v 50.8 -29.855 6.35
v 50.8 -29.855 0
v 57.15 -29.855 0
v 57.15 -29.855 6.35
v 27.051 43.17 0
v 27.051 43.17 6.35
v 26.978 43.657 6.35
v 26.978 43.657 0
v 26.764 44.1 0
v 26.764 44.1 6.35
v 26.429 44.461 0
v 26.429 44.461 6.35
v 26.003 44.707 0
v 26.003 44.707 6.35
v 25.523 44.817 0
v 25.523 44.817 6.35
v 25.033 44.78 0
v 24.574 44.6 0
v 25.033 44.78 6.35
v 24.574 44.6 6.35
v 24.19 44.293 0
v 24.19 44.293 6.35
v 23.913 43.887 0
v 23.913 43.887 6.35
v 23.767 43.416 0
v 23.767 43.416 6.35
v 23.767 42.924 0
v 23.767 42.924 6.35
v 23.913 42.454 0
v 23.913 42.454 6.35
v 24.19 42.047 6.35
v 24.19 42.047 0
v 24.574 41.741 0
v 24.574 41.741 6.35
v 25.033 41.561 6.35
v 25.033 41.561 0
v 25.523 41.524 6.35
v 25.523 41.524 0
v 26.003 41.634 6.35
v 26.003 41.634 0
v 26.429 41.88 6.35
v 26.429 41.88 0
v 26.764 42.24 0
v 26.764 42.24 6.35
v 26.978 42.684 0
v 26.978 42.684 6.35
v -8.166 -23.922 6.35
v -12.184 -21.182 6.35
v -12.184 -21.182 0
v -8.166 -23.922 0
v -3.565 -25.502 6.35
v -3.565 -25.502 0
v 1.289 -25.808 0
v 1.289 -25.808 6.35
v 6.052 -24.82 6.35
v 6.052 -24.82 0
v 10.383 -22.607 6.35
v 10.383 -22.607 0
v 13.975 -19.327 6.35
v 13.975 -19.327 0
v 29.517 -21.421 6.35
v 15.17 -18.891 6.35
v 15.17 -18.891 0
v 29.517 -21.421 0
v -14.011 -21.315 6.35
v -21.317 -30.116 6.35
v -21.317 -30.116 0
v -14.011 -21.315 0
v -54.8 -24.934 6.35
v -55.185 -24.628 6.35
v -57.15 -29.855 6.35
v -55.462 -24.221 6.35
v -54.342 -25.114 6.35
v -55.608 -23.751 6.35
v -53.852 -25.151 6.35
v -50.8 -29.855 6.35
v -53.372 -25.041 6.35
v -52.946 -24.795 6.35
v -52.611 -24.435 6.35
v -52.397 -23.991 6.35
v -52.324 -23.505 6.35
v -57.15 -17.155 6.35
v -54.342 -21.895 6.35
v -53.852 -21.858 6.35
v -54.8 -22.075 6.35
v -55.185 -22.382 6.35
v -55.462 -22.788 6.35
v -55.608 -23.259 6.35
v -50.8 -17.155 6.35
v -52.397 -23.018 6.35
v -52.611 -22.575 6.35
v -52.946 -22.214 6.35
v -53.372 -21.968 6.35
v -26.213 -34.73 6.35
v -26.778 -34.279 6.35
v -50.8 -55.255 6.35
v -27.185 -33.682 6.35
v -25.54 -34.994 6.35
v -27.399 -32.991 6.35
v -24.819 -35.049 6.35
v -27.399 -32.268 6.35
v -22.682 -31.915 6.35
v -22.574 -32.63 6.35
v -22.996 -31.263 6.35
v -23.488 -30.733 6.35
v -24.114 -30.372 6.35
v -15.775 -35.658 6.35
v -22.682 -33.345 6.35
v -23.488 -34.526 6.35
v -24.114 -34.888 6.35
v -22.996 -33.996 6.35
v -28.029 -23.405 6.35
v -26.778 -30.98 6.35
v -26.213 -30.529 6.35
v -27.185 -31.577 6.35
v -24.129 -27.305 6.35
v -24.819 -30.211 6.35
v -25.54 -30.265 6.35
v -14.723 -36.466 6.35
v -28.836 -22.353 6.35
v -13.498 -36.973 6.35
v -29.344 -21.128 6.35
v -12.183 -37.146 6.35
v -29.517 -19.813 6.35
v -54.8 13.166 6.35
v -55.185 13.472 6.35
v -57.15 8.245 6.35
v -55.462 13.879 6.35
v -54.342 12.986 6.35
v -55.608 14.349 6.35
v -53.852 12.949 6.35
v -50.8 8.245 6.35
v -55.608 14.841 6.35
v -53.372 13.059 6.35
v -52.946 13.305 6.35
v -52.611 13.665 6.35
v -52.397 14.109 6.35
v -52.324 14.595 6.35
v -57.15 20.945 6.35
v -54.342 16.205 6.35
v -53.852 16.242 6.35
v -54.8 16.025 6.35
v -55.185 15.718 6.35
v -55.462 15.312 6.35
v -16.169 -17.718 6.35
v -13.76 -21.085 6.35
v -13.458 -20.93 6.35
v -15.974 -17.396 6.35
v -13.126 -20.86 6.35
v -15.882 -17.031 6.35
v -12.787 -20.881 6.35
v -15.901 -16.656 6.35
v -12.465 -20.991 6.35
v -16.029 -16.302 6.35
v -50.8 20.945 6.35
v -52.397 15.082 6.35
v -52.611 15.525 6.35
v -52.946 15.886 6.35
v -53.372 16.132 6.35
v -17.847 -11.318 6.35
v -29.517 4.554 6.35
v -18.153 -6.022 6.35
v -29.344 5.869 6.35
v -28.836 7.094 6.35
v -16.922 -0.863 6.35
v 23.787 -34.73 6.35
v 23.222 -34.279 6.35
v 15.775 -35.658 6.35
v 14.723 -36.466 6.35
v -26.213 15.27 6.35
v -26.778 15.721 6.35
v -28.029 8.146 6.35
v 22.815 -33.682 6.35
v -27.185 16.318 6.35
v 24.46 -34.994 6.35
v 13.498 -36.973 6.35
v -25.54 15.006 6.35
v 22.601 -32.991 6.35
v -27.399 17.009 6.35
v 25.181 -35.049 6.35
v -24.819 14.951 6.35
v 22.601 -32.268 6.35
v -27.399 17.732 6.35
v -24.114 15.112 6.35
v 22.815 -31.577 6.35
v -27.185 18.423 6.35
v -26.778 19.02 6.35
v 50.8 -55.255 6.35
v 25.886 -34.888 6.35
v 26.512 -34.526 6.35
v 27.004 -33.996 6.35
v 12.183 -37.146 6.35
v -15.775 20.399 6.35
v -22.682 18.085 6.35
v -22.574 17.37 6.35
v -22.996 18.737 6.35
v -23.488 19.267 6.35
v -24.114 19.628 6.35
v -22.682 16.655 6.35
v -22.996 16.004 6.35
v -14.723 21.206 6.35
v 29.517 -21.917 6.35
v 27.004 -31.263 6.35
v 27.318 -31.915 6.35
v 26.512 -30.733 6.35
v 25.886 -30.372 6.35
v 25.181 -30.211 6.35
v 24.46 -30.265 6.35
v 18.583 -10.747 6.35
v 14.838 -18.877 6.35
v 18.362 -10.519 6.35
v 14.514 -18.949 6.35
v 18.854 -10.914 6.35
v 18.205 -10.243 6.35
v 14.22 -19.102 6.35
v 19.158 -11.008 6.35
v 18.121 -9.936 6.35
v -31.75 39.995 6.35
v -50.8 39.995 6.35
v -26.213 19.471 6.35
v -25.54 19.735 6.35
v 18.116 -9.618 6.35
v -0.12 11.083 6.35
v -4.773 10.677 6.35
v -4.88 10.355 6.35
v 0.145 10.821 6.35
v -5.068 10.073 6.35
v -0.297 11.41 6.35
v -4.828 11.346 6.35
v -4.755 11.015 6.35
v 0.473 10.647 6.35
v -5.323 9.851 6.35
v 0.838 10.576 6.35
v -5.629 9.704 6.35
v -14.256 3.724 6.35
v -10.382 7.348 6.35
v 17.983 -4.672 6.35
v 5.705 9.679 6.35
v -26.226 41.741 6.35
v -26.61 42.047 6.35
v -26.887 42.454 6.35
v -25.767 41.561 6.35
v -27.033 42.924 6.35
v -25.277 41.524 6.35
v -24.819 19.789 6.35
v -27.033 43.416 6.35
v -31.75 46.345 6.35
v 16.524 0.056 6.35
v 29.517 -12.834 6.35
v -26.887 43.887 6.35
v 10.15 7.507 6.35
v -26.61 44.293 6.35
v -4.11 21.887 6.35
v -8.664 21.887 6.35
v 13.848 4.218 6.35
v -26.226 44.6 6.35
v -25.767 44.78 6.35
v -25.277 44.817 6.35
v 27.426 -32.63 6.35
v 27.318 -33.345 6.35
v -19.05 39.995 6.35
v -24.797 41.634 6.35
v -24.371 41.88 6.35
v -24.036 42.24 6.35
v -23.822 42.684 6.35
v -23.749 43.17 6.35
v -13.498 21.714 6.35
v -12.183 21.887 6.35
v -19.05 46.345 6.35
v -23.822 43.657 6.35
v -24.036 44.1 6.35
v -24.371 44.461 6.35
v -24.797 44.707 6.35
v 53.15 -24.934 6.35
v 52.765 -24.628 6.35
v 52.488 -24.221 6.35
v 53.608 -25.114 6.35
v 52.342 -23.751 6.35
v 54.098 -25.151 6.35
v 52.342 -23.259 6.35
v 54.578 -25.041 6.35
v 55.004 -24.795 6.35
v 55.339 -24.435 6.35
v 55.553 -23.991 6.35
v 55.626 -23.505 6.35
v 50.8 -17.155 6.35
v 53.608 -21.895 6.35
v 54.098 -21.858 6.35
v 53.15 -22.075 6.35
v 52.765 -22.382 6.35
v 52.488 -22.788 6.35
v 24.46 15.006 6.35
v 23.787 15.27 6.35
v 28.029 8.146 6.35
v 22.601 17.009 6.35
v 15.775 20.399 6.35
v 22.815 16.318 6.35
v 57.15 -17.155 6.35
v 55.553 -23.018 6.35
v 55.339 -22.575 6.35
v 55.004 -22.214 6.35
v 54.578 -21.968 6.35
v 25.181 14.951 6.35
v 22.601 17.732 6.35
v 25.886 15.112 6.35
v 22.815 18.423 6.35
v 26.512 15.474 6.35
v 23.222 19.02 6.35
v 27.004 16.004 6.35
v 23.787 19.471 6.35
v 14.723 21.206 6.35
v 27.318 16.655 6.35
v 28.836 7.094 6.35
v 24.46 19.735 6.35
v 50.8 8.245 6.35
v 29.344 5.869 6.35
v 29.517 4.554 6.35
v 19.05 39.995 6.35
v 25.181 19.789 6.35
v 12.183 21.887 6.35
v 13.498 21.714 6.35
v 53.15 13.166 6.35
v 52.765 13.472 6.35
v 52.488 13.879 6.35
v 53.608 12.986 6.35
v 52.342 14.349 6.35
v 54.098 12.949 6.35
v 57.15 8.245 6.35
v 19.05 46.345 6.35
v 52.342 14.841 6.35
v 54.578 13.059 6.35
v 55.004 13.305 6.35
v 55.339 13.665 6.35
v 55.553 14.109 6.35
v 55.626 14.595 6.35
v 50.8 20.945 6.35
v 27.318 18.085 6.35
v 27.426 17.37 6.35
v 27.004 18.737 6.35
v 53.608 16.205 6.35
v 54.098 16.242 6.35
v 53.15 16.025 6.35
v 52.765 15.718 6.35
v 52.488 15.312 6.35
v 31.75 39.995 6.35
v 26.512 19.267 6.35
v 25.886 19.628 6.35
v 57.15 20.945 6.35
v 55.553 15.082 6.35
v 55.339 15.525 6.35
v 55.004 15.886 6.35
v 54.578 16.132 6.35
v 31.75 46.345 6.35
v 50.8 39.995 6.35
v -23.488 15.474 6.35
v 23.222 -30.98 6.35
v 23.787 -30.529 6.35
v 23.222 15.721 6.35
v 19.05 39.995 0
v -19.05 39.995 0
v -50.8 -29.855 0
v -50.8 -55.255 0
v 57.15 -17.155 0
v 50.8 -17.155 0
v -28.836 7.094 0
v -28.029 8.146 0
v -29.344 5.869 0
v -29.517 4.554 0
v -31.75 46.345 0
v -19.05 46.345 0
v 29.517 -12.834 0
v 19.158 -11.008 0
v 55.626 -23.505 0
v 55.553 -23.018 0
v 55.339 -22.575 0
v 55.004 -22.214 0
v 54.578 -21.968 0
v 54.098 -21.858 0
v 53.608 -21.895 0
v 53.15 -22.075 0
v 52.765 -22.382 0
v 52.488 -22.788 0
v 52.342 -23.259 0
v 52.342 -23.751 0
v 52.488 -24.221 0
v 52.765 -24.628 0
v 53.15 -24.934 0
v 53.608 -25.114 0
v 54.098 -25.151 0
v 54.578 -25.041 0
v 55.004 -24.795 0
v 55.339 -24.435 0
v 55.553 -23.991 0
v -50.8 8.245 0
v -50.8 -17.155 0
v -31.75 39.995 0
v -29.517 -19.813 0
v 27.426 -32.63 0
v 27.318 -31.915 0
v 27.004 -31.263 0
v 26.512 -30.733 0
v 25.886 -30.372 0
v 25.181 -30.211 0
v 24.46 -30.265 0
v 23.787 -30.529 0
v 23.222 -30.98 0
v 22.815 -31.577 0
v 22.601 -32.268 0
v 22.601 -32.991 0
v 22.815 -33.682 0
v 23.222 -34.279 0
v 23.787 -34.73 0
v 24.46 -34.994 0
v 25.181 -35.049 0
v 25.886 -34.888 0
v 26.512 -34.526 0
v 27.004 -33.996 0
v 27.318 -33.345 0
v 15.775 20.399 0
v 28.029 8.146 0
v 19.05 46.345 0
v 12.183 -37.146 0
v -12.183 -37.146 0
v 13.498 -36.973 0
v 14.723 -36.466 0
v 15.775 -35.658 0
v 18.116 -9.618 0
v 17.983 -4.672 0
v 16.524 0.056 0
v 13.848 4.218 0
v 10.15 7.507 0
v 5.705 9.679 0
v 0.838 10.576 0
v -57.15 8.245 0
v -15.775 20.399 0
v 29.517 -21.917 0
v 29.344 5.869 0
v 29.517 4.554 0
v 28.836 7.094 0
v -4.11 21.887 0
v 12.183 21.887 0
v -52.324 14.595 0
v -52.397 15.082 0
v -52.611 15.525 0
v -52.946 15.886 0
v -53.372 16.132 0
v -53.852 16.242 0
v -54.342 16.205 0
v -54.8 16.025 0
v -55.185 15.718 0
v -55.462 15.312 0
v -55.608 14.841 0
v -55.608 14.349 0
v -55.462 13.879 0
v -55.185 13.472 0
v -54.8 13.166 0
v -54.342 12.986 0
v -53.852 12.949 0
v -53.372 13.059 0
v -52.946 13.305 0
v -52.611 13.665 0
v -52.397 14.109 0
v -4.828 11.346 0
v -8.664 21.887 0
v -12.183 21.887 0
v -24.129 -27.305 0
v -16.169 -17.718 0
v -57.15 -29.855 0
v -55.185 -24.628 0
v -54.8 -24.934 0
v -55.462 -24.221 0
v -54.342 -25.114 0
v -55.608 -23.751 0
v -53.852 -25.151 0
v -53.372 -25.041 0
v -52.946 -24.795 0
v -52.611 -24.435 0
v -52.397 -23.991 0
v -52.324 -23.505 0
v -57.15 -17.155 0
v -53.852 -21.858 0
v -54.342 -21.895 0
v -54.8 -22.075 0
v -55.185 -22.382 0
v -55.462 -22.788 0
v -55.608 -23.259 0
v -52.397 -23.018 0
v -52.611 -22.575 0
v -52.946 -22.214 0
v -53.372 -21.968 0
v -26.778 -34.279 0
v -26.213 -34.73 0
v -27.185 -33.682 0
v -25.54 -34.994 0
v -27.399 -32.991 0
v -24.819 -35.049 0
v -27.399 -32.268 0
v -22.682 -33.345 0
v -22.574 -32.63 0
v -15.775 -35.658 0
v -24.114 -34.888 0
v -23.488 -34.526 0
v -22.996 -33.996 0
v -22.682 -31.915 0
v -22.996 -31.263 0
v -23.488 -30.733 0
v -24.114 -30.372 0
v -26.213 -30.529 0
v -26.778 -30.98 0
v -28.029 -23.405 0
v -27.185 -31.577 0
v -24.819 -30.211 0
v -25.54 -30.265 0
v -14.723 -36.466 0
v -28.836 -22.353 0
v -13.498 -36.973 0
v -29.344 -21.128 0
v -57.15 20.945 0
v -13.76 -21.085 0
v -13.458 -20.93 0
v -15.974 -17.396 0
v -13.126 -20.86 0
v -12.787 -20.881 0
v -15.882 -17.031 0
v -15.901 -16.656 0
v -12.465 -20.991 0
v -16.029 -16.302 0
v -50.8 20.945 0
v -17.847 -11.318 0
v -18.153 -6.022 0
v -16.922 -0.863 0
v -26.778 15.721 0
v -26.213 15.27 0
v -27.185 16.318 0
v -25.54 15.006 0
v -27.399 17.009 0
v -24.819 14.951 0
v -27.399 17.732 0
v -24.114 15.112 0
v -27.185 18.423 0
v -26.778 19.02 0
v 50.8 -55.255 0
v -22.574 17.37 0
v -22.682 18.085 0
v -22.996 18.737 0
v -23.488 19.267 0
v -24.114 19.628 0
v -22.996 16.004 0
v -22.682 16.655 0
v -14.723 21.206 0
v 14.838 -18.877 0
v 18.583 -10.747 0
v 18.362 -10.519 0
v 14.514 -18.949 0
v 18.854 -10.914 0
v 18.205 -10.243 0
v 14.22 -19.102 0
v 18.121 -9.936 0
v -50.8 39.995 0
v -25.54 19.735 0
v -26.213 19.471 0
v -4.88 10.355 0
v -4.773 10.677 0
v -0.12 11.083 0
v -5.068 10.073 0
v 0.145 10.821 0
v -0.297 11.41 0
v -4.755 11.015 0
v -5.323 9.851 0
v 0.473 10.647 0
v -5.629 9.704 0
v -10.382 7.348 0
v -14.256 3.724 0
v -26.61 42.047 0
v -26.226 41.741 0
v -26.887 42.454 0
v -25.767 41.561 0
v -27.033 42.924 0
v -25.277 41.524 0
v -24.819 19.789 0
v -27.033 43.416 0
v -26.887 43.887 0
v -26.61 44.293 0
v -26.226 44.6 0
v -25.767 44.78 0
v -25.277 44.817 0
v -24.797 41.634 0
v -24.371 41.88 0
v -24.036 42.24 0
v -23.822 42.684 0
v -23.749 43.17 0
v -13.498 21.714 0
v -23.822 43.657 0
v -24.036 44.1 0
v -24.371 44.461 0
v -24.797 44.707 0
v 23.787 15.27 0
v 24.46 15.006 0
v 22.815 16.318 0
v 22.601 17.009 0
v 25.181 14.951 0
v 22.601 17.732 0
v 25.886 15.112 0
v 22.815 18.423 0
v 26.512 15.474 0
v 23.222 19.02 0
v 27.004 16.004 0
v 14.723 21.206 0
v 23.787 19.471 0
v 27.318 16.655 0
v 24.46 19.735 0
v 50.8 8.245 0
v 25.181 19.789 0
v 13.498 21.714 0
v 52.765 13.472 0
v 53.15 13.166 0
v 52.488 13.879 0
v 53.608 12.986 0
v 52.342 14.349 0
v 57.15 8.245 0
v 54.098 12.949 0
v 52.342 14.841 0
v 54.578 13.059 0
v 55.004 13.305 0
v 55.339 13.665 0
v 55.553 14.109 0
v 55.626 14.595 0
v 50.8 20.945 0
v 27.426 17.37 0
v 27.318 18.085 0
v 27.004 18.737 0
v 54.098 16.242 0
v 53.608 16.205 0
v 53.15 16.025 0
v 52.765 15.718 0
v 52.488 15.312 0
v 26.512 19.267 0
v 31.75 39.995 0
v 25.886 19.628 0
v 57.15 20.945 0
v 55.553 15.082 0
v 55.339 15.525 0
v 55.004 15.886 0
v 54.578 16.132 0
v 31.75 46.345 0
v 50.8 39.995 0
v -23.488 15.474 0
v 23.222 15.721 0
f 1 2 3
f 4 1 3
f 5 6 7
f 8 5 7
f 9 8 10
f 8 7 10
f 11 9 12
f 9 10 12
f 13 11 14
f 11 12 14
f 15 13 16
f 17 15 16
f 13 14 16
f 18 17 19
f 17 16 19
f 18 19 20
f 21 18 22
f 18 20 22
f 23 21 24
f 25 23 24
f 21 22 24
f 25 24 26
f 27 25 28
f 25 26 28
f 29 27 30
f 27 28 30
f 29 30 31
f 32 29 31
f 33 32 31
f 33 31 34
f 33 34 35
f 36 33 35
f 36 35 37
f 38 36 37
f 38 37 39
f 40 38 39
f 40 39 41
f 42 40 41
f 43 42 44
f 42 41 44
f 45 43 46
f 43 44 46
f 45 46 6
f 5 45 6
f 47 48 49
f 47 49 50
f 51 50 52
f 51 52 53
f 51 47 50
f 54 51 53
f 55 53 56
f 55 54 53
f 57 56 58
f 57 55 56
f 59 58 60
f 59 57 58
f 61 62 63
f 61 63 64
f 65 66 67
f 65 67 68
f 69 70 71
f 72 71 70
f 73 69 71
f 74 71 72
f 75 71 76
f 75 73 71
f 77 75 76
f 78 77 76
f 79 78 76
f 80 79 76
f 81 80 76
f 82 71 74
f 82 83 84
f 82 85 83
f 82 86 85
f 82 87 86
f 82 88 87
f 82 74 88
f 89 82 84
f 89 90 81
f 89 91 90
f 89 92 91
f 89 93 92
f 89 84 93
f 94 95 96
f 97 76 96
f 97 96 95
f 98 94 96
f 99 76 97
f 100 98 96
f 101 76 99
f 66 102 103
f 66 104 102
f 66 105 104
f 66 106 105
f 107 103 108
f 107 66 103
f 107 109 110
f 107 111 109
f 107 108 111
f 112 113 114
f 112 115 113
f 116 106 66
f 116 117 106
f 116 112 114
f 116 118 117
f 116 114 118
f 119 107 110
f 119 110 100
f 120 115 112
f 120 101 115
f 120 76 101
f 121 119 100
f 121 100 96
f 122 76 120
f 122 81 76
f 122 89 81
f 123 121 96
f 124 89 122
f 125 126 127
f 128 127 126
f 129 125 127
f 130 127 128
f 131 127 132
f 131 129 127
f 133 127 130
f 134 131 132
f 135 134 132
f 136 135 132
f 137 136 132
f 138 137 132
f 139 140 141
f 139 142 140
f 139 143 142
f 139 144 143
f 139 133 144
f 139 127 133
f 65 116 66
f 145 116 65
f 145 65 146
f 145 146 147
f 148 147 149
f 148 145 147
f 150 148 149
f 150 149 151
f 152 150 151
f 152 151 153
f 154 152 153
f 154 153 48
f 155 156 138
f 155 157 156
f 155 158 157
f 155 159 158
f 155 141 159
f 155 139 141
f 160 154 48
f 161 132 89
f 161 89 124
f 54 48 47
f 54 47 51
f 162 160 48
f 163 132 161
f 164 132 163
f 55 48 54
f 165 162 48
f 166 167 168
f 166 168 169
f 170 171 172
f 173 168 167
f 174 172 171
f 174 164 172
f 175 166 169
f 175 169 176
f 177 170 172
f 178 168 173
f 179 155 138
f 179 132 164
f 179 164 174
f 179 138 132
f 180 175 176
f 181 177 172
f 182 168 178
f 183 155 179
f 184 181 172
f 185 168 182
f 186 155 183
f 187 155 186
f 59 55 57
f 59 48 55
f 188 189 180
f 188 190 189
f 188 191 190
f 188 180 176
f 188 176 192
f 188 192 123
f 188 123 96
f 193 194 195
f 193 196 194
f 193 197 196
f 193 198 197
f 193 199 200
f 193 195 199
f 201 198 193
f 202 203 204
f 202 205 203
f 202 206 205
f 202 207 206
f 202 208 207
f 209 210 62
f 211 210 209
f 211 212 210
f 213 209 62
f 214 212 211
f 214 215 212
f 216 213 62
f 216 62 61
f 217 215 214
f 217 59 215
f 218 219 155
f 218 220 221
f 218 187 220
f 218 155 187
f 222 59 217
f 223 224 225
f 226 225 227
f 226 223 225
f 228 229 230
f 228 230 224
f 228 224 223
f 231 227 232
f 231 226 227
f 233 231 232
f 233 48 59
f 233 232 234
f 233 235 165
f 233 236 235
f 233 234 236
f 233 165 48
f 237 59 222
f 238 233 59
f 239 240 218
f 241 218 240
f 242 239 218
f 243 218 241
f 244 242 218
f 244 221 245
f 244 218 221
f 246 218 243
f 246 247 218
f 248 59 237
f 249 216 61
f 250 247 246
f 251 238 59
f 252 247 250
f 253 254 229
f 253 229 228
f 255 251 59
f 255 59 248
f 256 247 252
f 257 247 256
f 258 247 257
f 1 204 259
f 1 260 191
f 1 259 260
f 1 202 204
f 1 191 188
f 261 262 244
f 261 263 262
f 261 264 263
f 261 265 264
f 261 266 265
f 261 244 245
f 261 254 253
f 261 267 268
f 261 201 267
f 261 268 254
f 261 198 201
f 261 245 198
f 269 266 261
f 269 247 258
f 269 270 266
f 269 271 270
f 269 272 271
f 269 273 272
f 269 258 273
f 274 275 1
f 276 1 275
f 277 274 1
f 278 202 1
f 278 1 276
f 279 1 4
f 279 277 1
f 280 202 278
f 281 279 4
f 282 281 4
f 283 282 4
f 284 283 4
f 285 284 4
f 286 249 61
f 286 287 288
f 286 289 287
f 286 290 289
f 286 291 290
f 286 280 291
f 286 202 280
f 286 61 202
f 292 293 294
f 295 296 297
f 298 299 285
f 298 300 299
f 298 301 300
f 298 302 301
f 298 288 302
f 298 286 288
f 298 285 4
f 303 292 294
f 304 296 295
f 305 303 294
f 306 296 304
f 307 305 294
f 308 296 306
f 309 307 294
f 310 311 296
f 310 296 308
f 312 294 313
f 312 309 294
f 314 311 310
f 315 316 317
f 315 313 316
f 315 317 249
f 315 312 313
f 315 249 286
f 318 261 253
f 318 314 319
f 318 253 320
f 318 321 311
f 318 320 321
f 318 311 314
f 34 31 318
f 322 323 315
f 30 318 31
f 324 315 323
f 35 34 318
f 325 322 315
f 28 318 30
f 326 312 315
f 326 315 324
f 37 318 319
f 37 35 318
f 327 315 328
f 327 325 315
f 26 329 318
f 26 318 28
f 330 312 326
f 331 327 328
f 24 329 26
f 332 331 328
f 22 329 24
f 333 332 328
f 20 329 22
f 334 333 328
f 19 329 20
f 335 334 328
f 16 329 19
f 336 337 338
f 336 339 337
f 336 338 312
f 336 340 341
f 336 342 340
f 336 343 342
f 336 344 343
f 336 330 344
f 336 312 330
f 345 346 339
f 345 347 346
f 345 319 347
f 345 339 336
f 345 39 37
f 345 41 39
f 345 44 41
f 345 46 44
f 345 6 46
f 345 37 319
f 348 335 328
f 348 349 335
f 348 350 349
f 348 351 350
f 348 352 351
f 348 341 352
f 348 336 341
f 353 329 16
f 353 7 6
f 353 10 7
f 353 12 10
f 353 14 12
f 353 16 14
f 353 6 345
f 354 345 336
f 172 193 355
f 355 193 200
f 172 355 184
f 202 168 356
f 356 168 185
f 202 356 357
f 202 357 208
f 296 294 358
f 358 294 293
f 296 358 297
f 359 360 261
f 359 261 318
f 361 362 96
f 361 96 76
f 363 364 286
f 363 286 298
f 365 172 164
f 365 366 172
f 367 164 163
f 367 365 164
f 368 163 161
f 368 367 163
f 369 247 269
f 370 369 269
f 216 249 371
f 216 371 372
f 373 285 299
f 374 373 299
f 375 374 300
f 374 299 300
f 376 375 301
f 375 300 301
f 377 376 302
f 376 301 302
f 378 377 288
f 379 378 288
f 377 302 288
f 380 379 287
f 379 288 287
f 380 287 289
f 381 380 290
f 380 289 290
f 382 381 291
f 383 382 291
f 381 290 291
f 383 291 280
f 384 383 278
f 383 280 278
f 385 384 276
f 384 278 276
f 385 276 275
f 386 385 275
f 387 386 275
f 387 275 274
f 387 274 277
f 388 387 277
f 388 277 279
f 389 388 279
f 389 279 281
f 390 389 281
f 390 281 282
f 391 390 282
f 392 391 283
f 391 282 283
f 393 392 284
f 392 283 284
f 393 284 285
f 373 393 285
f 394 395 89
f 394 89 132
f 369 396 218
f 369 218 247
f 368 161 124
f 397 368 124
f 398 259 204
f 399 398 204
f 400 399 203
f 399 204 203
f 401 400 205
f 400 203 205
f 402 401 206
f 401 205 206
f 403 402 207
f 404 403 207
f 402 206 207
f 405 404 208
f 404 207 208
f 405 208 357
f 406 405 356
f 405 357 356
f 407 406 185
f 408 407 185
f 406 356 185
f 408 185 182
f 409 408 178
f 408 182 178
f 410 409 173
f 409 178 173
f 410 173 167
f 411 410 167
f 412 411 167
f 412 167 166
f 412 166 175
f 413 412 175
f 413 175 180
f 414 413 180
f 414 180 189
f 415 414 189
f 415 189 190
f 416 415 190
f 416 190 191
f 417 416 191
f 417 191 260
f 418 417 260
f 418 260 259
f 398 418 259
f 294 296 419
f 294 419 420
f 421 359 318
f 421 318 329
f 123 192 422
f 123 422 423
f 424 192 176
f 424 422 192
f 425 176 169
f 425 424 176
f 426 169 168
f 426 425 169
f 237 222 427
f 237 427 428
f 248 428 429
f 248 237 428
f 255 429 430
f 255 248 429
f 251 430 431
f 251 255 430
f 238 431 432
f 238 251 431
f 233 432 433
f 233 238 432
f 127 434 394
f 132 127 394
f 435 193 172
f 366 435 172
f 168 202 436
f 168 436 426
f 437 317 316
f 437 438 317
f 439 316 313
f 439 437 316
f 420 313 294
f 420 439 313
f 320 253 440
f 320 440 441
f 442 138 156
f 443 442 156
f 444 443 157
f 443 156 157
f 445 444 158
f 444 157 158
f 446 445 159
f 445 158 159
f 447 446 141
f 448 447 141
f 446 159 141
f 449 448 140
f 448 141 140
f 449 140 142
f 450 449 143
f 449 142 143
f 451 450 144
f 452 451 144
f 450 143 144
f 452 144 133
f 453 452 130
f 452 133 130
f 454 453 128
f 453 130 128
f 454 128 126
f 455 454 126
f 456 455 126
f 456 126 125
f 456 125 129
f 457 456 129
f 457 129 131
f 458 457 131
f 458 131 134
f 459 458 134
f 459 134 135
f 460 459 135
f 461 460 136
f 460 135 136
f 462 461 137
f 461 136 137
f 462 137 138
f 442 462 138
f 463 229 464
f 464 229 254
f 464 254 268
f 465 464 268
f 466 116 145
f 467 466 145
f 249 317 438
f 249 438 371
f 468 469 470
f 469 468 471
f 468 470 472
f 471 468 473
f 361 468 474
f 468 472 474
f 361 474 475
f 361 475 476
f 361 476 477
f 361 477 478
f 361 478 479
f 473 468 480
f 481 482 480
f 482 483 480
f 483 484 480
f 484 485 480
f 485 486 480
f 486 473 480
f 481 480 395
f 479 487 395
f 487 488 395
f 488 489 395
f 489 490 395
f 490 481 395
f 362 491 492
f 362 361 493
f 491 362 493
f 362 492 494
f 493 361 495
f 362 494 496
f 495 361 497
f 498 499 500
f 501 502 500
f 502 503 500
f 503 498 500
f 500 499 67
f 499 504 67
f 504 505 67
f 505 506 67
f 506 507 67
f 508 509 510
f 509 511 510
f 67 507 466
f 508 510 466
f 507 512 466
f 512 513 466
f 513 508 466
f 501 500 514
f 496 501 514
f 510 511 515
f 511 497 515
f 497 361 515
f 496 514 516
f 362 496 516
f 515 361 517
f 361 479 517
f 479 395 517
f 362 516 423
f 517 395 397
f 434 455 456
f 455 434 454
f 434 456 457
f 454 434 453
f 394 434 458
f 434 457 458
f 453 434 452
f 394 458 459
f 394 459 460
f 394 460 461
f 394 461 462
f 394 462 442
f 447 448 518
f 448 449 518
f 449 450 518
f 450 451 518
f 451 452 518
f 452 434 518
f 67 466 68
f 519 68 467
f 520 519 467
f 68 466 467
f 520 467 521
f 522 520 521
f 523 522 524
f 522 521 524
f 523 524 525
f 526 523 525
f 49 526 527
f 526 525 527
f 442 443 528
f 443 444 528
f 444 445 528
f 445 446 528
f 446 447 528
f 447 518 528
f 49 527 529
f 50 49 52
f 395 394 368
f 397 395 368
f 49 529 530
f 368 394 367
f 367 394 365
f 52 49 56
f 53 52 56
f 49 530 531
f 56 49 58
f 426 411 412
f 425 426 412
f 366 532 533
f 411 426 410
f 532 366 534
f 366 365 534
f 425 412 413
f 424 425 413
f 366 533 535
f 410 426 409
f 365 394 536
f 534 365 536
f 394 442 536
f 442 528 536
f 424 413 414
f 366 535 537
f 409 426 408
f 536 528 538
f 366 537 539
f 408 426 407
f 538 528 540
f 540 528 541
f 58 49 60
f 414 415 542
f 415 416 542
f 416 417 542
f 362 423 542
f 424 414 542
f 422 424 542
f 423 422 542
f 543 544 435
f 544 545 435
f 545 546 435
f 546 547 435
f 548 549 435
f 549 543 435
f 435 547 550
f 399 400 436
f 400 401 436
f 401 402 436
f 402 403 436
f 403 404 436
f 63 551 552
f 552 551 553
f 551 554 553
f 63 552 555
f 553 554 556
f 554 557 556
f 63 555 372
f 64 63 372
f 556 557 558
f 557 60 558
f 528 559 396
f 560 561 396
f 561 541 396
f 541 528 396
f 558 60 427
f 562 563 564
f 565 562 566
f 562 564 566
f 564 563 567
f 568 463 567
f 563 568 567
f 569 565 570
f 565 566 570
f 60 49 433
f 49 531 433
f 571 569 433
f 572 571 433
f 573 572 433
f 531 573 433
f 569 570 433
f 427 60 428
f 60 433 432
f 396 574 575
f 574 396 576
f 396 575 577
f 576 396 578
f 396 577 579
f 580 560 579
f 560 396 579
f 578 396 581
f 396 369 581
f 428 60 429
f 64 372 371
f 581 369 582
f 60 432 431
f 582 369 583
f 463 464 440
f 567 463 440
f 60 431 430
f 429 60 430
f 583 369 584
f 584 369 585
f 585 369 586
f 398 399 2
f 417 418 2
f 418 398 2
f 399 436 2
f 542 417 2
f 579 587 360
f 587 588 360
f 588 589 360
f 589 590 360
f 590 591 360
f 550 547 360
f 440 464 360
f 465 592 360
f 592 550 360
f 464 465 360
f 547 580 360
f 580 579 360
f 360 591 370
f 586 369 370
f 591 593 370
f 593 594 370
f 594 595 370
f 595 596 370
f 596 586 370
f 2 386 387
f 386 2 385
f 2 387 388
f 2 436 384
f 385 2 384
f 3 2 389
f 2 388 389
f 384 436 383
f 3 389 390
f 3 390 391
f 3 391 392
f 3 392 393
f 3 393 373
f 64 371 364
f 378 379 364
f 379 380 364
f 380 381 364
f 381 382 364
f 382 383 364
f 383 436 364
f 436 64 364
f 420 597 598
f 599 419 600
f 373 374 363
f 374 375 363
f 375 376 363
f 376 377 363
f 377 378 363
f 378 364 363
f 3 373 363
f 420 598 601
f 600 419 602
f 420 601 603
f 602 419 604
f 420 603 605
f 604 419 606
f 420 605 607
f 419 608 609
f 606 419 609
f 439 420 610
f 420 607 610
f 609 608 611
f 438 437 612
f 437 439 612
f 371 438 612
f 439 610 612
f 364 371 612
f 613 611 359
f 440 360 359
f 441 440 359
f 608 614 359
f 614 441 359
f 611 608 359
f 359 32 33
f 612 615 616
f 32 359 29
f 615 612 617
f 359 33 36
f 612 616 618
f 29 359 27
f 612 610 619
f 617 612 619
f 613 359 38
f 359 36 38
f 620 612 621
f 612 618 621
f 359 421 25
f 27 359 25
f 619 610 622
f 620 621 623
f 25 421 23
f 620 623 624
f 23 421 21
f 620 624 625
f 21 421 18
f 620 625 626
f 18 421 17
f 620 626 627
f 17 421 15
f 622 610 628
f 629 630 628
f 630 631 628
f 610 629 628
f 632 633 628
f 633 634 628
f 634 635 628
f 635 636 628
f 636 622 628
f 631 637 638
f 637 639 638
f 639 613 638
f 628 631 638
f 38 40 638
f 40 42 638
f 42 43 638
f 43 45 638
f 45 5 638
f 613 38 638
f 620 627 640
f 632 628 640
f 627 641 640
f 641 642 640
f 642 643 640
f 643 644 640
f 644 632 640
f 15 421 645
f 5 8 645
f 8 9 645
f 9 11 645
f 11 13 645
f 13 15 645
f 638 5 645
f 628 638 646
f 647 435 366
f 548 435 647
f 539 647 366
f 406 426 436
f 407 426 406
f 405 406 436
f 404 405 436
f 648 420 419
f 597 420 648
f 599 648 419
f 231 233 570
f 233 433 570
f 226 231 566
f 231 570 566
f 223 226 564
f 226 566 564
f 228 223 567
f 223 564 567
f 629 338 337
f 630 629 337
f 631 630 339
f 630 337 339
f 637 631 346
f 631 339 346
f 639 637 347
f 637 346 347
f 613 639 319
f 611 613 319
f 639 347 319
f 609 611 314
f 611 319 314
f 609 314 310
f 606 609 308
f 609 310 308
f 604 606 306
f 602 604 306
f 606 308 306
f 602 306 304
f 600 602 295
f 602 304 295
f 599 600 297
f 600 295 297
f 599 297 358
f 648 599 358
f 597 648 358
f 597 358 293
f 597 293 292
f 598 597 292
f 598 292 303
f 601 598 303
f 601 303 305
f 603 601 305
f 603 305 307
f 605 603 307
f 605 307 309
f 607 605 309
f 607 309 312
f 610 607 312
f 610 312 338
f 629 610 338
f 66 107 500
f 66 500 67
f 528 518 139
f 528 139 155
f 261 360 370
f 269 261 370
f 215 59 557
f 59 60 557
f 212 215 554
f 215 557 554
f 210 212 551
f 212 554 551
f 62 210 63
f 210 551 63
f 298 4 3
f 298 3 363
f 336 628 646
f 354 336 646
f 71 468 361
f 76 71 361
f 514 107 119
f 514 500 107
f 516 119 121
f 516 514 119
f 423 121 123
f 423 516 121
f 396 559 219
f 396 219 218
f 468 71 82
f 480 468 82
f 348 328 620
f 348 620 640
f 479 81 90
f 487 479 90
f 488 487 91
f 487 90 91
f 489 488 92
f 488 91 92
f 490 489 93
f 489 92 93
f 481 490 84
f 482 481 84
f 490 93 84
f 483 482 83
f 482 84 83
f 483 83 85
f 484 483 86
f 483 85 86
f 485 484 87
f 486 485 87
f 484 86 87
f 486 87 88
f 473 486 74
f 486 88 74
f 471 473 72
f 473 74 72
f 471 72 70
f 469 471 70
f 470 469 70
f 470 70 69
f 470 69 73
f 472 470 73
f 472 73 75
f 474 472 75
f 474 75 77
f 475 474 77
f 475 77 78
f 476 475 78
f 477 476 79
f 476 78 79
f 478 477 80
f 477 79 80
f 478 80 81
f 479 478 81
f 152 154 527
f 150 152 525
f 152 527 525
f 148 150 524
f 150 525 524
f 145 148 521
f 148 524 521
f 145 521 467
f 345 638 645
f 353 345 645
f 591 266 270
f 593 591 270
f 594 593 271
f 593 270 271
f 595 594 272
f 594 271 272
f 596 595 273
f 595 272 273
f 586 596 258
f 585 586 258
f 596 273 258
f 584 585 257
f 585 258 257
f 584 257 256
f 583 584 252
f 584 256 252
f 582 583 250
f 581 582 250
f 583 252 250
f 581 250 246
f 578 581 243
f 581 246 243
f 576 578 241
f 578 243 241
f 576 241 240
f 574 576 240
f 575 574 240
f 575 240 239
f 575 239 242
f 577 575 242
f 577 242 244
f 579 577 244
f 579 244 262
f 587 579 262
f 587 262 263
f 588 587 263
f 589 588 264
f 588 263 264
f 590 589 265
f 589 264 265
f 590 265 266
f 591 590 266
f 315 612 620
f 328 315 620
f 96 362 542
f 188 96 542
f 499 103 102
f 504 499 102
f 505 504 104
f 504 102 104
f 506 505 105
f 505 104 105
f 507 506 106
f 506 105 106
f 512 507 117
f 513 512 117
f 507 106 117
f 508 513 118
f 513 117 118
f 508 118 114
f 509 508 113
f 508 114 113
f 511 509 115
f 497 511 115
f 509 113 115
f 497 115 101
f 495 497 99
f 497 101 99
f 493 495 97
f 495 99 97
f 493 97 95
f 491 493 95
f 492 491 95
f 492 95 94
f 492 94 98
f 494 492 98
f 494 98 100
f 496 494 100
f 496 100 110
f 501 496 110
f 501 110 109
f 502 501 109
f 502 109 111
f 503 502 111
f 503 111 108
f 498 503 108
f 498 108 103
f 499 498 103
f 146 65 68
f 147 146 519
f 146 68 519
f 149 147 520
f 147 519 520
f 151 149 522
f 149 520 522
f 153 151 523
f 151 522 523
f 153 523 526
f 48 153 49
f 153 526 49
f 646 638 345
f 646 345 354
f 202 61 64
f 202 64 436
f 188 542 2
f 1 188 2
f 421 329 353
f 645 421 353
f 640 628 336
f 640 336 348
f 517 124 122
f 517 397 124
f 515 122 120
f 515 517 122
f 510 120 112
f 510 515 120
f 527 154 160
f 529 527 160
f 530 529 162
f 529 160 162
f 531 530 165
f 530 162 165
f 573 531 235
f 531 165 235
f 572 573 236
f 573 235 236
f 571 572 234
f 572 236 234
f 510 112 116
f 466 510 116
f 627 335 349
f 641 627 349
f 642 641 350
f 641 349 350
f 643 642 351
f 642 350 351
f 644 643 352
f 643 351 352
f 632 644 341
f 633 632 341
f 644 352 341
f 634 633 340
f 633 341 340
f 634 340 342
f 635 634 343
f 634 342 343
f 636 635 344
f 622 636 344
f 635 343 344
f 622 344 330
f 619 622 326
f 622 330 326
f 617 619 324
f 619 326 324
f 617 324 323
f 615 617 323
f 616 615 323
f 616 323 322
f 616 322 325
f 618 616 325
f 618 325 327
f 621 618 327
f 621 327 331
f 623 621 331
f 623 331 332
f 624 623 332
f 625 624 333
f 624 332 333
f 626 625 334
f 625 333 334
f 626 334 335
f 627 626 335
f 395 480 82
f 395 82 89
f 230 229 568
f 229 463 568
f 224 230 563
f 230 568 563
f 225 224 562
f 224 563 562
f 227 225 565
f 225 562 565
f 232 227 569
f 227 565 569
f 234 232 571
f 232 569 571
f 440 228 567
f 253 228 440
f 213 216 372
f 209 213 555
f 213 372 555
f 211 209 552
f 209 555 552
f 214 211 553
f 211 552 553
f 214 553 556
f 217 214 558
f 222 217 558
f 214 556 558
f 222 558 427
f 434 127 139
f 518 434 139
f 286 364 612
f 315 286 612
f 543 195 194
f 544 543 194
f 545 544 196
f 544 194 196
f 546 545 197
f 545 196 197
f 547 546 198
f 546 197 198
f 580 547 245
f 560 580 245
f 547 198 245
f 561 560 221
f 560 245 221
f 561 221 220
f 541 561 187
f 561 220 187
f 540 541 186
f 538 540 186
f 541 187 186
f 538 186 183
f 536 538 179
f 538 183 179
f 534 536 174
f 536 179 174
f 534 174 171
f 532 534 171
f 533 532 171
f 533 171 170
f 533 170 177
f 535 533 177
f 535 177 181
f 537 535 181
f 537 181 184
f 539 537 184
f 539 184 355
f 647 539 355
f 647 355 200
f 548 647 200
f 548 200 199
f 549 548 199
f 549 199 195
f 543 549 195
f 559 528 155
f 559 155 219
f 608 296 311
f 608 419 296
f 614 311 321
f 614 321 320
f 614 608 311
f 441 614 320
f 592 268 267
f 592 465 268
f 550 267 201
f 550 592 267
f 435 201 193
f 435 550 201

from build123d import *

# Parameters (mm, degrees)
SKETCH1_W           = 101.6
SKETCH1_H           = 95.25
BOSS_EXTRUDE1_DEPTH = 6.35
SKETCH2_W           = 12.7
SKETCH2_H           = 6.35
SKETCH2_R           = 1.651
SKETCH2_W_2         = 6.35
SKETCH2_H_2         = 12.7
BOSS_EXTRUDE2_DEPTH = 6.35
SKETCH5_R           = 2.4257
CUT_EXTRUDE1_DEPTH  = 80.746567925
FILLET1_R           = 5.08
FILLET2_R           = 1.27


with BuildPart() as part:
    # Sketch1 → Boss-Extrude1 (new body)
    with BuildSketch(Plane.XY):
        with Locations((0, -7.629593436)):
            Rectangle(SKETCH1_W, SKETCH1_H)
    extrude(amount=BOSS_EXTRUDE1_DEPTH)

    # Sketch2 → Boss-Extrude2 (add)
    # profile 1 of 6: a face of its own
    with BuildSketch(Plane.XY.offset(6.35)):
        with Locations((-25.4, 43.170406564)):
            Rectangle(SKETCH2_W, SKETCH2_H)
        with Locations((-25.4, 43.170406564)):
            Circle(SKETCH2_R, mode=Mode.SUBTRACT)
    # profile 2 of 6: a face of its own
    with BuildSketch(Plane.XY.offset(6.35)):
        with Locations((25.4, 43.170406564)):
            Rectangle(SKETCH2_W, SKETCH2_H)
        with Locations((25.4, 43.170406564)):
            Circle(SKETCH2_R, mode=Mode.SUBTRACT)
    # profile 3 of 6: a face of its own
    with BuildSketch(Plane.XY.offset(6.35)):
        with Locations((53.975, 14.595406564)):
            Rectangle(SKETCH2_W_2, SKETCH2_H_2)
        with Locations((53.975, 14.595406564)):
            Circle(SKETCH2_R, mode=Mode.SUBTRACT)
    # profile 4 of 6: a face of its own
    with BuildSketch(Plane.XY.offset(6.35)):
        with Locations((-53.975, 14.595406564)):
            Rectangle(SKETCH2_W_2, SKETCH2_H_2)
        with Locations((-53.975, 14.595406564)):
            Circle(SKETCH2_R, mode=Mode.SUBTRACT)
    # profile 5 of 6: a face of its own
    with BuildSketch(Plane.XY.offset(6.35)):
        with Locations((-53.975, -23.504593436)):
            Rectangle(SKETCH2_W_2, SKETCH2_H_2)
        with Locations((-53.975, -23.504593436)):
            Circle(SKETCH2_R, mode=Mode.SUBTRACT)
    # profile 6 of 6: a face of its own
    with BuildSketch(Plane.XY.offset(6.35)):
        with Locations((53.975, -23.504593436)):
            Rectangle(SKETCH2_W_2, SKETCH2_H_2)
        with Locations((53.975, -23.504593436)):
            Circle(SKETCH2_R, mode=Mode.SUBTRACT)
    extrude(amount=-BOSS_EXTRUDE2_DEPTH)

    # Sketch5 → Cut-Extrude1 (cut, through all)
    with BuildSketch(Plane.XY.offset(6.35)):
        with Locations((-25, 17.370406564)):
            Circle(SKETCH5_R)
        with Locations((25, 17.370406564)):
            Circle(SKETCH5_R)
        with Locations((25, -32.629593436)):
            Circle(SKETCH5_R)
        with Locations((-25, -32.629593436)):
            Circle(SKETCH5_R)
        with BuildLine():
            Line((-24.128510609, -27.305247108), (-15.606604031, -17.040561021))
            ThreePointArc((-15.606604031, -17.040561021), (-16.83342633, -0.646173195), (-4.361627061, 10.065281801))
            Line((-4.361627061, 10.065281801), (-8.664406389, 21.887070846))
            Line((-8.664406389, 21.887070846), (-14.2875, 21.887070846))
            Line((-14.2875, 21.887070846), (-29.516664282, 6.657906564))
            Line((-29.516664282, 6.657906564), (-29.516664282, -21.917093436))
            Line((-29.516664282, -21.917093436), (-24.128510609, -27.305247108))
        make_face()
        with BuildLine():
            Line((-21.317277104, -30.116480614), (-13.135965935, -20.262043681))
            ThreePointArc((-13.135965935, -20.262043681), (0.990969666, -25.827131164), (14.430051116, -18.760901761))
            Line((14.430051116, -18.760901761), (29.516664282, -21.42107871))
            Line((29.516664282, -21.42107871), (29.516664282, -21.917093436))
            Line((29.516664282, -21.917093436), (14.2875, -37.146257718))
            Line((14.2875, -37.146257718), (-14.2875, -37.146257718))
            Line((-14.2875, -37.146257718), (-21.317277104, -30.116480614))
        make_face()
        with BuildLine():
            Line((29.516664282, -12.834177729), (17.947628895, -10.79424465))
            ThreePointArc((17.947628895, -10.79424465), (13.960776954, 4.084889357), (0, 10.594906564))
            Line((0, 10.594906564), (-4.110011679, 21.887070846))
            Line((-4.110011679, 21.887070846), (14.2875, 21.887070846))
            Line((14.2875, 21.887070846), (29.516664282, 6.657906564))
            Line((29.516664282, 6.657906564), (29.516664282, -12.834177729))
        make_face()
    extrude(amount=-CUT_EXTRUDE1_DEPTH, mode=Mode.SUBTRACT)

    # Fillet1
    fillet1_edges = [part.edges().sort_by_distance(p)[0] for p in [
        (-29.516664282, 6.657906564, 3.175),
        (-14.2875, 21.887070846, 3.175),
        (-29.516664282, -21.917093436, 3.175),
        (14.2875, -37.146257718, 3.175),
        (-14.2875, -37.146257718, 3.175),
        (14.2875, 21.887070846, 3.175),
        (29.516664282, 6.657906564, 3.175),
    ]]
    fillet(fillet1_edges, radius=FILLET1_R)

    # Fillet2
    fillet2_edges = [part.edges().sort_by_distance(p)[0] for p in [
        (-4.361627061, 10.065281801, 3.175),
        (-15.606604031, -17.040561021, 3.175),
        (-13.135965935, -20.262043681, 3.175),
        (14.430051116, -18.760901761, 3.175),
        (17.947628895, -10.79424465, 3.175),
        (0, 10.594906564, 3.175),
    ]]
    fillet(fillet2_edges, radius=FILLET2_R)


solid = part.part
